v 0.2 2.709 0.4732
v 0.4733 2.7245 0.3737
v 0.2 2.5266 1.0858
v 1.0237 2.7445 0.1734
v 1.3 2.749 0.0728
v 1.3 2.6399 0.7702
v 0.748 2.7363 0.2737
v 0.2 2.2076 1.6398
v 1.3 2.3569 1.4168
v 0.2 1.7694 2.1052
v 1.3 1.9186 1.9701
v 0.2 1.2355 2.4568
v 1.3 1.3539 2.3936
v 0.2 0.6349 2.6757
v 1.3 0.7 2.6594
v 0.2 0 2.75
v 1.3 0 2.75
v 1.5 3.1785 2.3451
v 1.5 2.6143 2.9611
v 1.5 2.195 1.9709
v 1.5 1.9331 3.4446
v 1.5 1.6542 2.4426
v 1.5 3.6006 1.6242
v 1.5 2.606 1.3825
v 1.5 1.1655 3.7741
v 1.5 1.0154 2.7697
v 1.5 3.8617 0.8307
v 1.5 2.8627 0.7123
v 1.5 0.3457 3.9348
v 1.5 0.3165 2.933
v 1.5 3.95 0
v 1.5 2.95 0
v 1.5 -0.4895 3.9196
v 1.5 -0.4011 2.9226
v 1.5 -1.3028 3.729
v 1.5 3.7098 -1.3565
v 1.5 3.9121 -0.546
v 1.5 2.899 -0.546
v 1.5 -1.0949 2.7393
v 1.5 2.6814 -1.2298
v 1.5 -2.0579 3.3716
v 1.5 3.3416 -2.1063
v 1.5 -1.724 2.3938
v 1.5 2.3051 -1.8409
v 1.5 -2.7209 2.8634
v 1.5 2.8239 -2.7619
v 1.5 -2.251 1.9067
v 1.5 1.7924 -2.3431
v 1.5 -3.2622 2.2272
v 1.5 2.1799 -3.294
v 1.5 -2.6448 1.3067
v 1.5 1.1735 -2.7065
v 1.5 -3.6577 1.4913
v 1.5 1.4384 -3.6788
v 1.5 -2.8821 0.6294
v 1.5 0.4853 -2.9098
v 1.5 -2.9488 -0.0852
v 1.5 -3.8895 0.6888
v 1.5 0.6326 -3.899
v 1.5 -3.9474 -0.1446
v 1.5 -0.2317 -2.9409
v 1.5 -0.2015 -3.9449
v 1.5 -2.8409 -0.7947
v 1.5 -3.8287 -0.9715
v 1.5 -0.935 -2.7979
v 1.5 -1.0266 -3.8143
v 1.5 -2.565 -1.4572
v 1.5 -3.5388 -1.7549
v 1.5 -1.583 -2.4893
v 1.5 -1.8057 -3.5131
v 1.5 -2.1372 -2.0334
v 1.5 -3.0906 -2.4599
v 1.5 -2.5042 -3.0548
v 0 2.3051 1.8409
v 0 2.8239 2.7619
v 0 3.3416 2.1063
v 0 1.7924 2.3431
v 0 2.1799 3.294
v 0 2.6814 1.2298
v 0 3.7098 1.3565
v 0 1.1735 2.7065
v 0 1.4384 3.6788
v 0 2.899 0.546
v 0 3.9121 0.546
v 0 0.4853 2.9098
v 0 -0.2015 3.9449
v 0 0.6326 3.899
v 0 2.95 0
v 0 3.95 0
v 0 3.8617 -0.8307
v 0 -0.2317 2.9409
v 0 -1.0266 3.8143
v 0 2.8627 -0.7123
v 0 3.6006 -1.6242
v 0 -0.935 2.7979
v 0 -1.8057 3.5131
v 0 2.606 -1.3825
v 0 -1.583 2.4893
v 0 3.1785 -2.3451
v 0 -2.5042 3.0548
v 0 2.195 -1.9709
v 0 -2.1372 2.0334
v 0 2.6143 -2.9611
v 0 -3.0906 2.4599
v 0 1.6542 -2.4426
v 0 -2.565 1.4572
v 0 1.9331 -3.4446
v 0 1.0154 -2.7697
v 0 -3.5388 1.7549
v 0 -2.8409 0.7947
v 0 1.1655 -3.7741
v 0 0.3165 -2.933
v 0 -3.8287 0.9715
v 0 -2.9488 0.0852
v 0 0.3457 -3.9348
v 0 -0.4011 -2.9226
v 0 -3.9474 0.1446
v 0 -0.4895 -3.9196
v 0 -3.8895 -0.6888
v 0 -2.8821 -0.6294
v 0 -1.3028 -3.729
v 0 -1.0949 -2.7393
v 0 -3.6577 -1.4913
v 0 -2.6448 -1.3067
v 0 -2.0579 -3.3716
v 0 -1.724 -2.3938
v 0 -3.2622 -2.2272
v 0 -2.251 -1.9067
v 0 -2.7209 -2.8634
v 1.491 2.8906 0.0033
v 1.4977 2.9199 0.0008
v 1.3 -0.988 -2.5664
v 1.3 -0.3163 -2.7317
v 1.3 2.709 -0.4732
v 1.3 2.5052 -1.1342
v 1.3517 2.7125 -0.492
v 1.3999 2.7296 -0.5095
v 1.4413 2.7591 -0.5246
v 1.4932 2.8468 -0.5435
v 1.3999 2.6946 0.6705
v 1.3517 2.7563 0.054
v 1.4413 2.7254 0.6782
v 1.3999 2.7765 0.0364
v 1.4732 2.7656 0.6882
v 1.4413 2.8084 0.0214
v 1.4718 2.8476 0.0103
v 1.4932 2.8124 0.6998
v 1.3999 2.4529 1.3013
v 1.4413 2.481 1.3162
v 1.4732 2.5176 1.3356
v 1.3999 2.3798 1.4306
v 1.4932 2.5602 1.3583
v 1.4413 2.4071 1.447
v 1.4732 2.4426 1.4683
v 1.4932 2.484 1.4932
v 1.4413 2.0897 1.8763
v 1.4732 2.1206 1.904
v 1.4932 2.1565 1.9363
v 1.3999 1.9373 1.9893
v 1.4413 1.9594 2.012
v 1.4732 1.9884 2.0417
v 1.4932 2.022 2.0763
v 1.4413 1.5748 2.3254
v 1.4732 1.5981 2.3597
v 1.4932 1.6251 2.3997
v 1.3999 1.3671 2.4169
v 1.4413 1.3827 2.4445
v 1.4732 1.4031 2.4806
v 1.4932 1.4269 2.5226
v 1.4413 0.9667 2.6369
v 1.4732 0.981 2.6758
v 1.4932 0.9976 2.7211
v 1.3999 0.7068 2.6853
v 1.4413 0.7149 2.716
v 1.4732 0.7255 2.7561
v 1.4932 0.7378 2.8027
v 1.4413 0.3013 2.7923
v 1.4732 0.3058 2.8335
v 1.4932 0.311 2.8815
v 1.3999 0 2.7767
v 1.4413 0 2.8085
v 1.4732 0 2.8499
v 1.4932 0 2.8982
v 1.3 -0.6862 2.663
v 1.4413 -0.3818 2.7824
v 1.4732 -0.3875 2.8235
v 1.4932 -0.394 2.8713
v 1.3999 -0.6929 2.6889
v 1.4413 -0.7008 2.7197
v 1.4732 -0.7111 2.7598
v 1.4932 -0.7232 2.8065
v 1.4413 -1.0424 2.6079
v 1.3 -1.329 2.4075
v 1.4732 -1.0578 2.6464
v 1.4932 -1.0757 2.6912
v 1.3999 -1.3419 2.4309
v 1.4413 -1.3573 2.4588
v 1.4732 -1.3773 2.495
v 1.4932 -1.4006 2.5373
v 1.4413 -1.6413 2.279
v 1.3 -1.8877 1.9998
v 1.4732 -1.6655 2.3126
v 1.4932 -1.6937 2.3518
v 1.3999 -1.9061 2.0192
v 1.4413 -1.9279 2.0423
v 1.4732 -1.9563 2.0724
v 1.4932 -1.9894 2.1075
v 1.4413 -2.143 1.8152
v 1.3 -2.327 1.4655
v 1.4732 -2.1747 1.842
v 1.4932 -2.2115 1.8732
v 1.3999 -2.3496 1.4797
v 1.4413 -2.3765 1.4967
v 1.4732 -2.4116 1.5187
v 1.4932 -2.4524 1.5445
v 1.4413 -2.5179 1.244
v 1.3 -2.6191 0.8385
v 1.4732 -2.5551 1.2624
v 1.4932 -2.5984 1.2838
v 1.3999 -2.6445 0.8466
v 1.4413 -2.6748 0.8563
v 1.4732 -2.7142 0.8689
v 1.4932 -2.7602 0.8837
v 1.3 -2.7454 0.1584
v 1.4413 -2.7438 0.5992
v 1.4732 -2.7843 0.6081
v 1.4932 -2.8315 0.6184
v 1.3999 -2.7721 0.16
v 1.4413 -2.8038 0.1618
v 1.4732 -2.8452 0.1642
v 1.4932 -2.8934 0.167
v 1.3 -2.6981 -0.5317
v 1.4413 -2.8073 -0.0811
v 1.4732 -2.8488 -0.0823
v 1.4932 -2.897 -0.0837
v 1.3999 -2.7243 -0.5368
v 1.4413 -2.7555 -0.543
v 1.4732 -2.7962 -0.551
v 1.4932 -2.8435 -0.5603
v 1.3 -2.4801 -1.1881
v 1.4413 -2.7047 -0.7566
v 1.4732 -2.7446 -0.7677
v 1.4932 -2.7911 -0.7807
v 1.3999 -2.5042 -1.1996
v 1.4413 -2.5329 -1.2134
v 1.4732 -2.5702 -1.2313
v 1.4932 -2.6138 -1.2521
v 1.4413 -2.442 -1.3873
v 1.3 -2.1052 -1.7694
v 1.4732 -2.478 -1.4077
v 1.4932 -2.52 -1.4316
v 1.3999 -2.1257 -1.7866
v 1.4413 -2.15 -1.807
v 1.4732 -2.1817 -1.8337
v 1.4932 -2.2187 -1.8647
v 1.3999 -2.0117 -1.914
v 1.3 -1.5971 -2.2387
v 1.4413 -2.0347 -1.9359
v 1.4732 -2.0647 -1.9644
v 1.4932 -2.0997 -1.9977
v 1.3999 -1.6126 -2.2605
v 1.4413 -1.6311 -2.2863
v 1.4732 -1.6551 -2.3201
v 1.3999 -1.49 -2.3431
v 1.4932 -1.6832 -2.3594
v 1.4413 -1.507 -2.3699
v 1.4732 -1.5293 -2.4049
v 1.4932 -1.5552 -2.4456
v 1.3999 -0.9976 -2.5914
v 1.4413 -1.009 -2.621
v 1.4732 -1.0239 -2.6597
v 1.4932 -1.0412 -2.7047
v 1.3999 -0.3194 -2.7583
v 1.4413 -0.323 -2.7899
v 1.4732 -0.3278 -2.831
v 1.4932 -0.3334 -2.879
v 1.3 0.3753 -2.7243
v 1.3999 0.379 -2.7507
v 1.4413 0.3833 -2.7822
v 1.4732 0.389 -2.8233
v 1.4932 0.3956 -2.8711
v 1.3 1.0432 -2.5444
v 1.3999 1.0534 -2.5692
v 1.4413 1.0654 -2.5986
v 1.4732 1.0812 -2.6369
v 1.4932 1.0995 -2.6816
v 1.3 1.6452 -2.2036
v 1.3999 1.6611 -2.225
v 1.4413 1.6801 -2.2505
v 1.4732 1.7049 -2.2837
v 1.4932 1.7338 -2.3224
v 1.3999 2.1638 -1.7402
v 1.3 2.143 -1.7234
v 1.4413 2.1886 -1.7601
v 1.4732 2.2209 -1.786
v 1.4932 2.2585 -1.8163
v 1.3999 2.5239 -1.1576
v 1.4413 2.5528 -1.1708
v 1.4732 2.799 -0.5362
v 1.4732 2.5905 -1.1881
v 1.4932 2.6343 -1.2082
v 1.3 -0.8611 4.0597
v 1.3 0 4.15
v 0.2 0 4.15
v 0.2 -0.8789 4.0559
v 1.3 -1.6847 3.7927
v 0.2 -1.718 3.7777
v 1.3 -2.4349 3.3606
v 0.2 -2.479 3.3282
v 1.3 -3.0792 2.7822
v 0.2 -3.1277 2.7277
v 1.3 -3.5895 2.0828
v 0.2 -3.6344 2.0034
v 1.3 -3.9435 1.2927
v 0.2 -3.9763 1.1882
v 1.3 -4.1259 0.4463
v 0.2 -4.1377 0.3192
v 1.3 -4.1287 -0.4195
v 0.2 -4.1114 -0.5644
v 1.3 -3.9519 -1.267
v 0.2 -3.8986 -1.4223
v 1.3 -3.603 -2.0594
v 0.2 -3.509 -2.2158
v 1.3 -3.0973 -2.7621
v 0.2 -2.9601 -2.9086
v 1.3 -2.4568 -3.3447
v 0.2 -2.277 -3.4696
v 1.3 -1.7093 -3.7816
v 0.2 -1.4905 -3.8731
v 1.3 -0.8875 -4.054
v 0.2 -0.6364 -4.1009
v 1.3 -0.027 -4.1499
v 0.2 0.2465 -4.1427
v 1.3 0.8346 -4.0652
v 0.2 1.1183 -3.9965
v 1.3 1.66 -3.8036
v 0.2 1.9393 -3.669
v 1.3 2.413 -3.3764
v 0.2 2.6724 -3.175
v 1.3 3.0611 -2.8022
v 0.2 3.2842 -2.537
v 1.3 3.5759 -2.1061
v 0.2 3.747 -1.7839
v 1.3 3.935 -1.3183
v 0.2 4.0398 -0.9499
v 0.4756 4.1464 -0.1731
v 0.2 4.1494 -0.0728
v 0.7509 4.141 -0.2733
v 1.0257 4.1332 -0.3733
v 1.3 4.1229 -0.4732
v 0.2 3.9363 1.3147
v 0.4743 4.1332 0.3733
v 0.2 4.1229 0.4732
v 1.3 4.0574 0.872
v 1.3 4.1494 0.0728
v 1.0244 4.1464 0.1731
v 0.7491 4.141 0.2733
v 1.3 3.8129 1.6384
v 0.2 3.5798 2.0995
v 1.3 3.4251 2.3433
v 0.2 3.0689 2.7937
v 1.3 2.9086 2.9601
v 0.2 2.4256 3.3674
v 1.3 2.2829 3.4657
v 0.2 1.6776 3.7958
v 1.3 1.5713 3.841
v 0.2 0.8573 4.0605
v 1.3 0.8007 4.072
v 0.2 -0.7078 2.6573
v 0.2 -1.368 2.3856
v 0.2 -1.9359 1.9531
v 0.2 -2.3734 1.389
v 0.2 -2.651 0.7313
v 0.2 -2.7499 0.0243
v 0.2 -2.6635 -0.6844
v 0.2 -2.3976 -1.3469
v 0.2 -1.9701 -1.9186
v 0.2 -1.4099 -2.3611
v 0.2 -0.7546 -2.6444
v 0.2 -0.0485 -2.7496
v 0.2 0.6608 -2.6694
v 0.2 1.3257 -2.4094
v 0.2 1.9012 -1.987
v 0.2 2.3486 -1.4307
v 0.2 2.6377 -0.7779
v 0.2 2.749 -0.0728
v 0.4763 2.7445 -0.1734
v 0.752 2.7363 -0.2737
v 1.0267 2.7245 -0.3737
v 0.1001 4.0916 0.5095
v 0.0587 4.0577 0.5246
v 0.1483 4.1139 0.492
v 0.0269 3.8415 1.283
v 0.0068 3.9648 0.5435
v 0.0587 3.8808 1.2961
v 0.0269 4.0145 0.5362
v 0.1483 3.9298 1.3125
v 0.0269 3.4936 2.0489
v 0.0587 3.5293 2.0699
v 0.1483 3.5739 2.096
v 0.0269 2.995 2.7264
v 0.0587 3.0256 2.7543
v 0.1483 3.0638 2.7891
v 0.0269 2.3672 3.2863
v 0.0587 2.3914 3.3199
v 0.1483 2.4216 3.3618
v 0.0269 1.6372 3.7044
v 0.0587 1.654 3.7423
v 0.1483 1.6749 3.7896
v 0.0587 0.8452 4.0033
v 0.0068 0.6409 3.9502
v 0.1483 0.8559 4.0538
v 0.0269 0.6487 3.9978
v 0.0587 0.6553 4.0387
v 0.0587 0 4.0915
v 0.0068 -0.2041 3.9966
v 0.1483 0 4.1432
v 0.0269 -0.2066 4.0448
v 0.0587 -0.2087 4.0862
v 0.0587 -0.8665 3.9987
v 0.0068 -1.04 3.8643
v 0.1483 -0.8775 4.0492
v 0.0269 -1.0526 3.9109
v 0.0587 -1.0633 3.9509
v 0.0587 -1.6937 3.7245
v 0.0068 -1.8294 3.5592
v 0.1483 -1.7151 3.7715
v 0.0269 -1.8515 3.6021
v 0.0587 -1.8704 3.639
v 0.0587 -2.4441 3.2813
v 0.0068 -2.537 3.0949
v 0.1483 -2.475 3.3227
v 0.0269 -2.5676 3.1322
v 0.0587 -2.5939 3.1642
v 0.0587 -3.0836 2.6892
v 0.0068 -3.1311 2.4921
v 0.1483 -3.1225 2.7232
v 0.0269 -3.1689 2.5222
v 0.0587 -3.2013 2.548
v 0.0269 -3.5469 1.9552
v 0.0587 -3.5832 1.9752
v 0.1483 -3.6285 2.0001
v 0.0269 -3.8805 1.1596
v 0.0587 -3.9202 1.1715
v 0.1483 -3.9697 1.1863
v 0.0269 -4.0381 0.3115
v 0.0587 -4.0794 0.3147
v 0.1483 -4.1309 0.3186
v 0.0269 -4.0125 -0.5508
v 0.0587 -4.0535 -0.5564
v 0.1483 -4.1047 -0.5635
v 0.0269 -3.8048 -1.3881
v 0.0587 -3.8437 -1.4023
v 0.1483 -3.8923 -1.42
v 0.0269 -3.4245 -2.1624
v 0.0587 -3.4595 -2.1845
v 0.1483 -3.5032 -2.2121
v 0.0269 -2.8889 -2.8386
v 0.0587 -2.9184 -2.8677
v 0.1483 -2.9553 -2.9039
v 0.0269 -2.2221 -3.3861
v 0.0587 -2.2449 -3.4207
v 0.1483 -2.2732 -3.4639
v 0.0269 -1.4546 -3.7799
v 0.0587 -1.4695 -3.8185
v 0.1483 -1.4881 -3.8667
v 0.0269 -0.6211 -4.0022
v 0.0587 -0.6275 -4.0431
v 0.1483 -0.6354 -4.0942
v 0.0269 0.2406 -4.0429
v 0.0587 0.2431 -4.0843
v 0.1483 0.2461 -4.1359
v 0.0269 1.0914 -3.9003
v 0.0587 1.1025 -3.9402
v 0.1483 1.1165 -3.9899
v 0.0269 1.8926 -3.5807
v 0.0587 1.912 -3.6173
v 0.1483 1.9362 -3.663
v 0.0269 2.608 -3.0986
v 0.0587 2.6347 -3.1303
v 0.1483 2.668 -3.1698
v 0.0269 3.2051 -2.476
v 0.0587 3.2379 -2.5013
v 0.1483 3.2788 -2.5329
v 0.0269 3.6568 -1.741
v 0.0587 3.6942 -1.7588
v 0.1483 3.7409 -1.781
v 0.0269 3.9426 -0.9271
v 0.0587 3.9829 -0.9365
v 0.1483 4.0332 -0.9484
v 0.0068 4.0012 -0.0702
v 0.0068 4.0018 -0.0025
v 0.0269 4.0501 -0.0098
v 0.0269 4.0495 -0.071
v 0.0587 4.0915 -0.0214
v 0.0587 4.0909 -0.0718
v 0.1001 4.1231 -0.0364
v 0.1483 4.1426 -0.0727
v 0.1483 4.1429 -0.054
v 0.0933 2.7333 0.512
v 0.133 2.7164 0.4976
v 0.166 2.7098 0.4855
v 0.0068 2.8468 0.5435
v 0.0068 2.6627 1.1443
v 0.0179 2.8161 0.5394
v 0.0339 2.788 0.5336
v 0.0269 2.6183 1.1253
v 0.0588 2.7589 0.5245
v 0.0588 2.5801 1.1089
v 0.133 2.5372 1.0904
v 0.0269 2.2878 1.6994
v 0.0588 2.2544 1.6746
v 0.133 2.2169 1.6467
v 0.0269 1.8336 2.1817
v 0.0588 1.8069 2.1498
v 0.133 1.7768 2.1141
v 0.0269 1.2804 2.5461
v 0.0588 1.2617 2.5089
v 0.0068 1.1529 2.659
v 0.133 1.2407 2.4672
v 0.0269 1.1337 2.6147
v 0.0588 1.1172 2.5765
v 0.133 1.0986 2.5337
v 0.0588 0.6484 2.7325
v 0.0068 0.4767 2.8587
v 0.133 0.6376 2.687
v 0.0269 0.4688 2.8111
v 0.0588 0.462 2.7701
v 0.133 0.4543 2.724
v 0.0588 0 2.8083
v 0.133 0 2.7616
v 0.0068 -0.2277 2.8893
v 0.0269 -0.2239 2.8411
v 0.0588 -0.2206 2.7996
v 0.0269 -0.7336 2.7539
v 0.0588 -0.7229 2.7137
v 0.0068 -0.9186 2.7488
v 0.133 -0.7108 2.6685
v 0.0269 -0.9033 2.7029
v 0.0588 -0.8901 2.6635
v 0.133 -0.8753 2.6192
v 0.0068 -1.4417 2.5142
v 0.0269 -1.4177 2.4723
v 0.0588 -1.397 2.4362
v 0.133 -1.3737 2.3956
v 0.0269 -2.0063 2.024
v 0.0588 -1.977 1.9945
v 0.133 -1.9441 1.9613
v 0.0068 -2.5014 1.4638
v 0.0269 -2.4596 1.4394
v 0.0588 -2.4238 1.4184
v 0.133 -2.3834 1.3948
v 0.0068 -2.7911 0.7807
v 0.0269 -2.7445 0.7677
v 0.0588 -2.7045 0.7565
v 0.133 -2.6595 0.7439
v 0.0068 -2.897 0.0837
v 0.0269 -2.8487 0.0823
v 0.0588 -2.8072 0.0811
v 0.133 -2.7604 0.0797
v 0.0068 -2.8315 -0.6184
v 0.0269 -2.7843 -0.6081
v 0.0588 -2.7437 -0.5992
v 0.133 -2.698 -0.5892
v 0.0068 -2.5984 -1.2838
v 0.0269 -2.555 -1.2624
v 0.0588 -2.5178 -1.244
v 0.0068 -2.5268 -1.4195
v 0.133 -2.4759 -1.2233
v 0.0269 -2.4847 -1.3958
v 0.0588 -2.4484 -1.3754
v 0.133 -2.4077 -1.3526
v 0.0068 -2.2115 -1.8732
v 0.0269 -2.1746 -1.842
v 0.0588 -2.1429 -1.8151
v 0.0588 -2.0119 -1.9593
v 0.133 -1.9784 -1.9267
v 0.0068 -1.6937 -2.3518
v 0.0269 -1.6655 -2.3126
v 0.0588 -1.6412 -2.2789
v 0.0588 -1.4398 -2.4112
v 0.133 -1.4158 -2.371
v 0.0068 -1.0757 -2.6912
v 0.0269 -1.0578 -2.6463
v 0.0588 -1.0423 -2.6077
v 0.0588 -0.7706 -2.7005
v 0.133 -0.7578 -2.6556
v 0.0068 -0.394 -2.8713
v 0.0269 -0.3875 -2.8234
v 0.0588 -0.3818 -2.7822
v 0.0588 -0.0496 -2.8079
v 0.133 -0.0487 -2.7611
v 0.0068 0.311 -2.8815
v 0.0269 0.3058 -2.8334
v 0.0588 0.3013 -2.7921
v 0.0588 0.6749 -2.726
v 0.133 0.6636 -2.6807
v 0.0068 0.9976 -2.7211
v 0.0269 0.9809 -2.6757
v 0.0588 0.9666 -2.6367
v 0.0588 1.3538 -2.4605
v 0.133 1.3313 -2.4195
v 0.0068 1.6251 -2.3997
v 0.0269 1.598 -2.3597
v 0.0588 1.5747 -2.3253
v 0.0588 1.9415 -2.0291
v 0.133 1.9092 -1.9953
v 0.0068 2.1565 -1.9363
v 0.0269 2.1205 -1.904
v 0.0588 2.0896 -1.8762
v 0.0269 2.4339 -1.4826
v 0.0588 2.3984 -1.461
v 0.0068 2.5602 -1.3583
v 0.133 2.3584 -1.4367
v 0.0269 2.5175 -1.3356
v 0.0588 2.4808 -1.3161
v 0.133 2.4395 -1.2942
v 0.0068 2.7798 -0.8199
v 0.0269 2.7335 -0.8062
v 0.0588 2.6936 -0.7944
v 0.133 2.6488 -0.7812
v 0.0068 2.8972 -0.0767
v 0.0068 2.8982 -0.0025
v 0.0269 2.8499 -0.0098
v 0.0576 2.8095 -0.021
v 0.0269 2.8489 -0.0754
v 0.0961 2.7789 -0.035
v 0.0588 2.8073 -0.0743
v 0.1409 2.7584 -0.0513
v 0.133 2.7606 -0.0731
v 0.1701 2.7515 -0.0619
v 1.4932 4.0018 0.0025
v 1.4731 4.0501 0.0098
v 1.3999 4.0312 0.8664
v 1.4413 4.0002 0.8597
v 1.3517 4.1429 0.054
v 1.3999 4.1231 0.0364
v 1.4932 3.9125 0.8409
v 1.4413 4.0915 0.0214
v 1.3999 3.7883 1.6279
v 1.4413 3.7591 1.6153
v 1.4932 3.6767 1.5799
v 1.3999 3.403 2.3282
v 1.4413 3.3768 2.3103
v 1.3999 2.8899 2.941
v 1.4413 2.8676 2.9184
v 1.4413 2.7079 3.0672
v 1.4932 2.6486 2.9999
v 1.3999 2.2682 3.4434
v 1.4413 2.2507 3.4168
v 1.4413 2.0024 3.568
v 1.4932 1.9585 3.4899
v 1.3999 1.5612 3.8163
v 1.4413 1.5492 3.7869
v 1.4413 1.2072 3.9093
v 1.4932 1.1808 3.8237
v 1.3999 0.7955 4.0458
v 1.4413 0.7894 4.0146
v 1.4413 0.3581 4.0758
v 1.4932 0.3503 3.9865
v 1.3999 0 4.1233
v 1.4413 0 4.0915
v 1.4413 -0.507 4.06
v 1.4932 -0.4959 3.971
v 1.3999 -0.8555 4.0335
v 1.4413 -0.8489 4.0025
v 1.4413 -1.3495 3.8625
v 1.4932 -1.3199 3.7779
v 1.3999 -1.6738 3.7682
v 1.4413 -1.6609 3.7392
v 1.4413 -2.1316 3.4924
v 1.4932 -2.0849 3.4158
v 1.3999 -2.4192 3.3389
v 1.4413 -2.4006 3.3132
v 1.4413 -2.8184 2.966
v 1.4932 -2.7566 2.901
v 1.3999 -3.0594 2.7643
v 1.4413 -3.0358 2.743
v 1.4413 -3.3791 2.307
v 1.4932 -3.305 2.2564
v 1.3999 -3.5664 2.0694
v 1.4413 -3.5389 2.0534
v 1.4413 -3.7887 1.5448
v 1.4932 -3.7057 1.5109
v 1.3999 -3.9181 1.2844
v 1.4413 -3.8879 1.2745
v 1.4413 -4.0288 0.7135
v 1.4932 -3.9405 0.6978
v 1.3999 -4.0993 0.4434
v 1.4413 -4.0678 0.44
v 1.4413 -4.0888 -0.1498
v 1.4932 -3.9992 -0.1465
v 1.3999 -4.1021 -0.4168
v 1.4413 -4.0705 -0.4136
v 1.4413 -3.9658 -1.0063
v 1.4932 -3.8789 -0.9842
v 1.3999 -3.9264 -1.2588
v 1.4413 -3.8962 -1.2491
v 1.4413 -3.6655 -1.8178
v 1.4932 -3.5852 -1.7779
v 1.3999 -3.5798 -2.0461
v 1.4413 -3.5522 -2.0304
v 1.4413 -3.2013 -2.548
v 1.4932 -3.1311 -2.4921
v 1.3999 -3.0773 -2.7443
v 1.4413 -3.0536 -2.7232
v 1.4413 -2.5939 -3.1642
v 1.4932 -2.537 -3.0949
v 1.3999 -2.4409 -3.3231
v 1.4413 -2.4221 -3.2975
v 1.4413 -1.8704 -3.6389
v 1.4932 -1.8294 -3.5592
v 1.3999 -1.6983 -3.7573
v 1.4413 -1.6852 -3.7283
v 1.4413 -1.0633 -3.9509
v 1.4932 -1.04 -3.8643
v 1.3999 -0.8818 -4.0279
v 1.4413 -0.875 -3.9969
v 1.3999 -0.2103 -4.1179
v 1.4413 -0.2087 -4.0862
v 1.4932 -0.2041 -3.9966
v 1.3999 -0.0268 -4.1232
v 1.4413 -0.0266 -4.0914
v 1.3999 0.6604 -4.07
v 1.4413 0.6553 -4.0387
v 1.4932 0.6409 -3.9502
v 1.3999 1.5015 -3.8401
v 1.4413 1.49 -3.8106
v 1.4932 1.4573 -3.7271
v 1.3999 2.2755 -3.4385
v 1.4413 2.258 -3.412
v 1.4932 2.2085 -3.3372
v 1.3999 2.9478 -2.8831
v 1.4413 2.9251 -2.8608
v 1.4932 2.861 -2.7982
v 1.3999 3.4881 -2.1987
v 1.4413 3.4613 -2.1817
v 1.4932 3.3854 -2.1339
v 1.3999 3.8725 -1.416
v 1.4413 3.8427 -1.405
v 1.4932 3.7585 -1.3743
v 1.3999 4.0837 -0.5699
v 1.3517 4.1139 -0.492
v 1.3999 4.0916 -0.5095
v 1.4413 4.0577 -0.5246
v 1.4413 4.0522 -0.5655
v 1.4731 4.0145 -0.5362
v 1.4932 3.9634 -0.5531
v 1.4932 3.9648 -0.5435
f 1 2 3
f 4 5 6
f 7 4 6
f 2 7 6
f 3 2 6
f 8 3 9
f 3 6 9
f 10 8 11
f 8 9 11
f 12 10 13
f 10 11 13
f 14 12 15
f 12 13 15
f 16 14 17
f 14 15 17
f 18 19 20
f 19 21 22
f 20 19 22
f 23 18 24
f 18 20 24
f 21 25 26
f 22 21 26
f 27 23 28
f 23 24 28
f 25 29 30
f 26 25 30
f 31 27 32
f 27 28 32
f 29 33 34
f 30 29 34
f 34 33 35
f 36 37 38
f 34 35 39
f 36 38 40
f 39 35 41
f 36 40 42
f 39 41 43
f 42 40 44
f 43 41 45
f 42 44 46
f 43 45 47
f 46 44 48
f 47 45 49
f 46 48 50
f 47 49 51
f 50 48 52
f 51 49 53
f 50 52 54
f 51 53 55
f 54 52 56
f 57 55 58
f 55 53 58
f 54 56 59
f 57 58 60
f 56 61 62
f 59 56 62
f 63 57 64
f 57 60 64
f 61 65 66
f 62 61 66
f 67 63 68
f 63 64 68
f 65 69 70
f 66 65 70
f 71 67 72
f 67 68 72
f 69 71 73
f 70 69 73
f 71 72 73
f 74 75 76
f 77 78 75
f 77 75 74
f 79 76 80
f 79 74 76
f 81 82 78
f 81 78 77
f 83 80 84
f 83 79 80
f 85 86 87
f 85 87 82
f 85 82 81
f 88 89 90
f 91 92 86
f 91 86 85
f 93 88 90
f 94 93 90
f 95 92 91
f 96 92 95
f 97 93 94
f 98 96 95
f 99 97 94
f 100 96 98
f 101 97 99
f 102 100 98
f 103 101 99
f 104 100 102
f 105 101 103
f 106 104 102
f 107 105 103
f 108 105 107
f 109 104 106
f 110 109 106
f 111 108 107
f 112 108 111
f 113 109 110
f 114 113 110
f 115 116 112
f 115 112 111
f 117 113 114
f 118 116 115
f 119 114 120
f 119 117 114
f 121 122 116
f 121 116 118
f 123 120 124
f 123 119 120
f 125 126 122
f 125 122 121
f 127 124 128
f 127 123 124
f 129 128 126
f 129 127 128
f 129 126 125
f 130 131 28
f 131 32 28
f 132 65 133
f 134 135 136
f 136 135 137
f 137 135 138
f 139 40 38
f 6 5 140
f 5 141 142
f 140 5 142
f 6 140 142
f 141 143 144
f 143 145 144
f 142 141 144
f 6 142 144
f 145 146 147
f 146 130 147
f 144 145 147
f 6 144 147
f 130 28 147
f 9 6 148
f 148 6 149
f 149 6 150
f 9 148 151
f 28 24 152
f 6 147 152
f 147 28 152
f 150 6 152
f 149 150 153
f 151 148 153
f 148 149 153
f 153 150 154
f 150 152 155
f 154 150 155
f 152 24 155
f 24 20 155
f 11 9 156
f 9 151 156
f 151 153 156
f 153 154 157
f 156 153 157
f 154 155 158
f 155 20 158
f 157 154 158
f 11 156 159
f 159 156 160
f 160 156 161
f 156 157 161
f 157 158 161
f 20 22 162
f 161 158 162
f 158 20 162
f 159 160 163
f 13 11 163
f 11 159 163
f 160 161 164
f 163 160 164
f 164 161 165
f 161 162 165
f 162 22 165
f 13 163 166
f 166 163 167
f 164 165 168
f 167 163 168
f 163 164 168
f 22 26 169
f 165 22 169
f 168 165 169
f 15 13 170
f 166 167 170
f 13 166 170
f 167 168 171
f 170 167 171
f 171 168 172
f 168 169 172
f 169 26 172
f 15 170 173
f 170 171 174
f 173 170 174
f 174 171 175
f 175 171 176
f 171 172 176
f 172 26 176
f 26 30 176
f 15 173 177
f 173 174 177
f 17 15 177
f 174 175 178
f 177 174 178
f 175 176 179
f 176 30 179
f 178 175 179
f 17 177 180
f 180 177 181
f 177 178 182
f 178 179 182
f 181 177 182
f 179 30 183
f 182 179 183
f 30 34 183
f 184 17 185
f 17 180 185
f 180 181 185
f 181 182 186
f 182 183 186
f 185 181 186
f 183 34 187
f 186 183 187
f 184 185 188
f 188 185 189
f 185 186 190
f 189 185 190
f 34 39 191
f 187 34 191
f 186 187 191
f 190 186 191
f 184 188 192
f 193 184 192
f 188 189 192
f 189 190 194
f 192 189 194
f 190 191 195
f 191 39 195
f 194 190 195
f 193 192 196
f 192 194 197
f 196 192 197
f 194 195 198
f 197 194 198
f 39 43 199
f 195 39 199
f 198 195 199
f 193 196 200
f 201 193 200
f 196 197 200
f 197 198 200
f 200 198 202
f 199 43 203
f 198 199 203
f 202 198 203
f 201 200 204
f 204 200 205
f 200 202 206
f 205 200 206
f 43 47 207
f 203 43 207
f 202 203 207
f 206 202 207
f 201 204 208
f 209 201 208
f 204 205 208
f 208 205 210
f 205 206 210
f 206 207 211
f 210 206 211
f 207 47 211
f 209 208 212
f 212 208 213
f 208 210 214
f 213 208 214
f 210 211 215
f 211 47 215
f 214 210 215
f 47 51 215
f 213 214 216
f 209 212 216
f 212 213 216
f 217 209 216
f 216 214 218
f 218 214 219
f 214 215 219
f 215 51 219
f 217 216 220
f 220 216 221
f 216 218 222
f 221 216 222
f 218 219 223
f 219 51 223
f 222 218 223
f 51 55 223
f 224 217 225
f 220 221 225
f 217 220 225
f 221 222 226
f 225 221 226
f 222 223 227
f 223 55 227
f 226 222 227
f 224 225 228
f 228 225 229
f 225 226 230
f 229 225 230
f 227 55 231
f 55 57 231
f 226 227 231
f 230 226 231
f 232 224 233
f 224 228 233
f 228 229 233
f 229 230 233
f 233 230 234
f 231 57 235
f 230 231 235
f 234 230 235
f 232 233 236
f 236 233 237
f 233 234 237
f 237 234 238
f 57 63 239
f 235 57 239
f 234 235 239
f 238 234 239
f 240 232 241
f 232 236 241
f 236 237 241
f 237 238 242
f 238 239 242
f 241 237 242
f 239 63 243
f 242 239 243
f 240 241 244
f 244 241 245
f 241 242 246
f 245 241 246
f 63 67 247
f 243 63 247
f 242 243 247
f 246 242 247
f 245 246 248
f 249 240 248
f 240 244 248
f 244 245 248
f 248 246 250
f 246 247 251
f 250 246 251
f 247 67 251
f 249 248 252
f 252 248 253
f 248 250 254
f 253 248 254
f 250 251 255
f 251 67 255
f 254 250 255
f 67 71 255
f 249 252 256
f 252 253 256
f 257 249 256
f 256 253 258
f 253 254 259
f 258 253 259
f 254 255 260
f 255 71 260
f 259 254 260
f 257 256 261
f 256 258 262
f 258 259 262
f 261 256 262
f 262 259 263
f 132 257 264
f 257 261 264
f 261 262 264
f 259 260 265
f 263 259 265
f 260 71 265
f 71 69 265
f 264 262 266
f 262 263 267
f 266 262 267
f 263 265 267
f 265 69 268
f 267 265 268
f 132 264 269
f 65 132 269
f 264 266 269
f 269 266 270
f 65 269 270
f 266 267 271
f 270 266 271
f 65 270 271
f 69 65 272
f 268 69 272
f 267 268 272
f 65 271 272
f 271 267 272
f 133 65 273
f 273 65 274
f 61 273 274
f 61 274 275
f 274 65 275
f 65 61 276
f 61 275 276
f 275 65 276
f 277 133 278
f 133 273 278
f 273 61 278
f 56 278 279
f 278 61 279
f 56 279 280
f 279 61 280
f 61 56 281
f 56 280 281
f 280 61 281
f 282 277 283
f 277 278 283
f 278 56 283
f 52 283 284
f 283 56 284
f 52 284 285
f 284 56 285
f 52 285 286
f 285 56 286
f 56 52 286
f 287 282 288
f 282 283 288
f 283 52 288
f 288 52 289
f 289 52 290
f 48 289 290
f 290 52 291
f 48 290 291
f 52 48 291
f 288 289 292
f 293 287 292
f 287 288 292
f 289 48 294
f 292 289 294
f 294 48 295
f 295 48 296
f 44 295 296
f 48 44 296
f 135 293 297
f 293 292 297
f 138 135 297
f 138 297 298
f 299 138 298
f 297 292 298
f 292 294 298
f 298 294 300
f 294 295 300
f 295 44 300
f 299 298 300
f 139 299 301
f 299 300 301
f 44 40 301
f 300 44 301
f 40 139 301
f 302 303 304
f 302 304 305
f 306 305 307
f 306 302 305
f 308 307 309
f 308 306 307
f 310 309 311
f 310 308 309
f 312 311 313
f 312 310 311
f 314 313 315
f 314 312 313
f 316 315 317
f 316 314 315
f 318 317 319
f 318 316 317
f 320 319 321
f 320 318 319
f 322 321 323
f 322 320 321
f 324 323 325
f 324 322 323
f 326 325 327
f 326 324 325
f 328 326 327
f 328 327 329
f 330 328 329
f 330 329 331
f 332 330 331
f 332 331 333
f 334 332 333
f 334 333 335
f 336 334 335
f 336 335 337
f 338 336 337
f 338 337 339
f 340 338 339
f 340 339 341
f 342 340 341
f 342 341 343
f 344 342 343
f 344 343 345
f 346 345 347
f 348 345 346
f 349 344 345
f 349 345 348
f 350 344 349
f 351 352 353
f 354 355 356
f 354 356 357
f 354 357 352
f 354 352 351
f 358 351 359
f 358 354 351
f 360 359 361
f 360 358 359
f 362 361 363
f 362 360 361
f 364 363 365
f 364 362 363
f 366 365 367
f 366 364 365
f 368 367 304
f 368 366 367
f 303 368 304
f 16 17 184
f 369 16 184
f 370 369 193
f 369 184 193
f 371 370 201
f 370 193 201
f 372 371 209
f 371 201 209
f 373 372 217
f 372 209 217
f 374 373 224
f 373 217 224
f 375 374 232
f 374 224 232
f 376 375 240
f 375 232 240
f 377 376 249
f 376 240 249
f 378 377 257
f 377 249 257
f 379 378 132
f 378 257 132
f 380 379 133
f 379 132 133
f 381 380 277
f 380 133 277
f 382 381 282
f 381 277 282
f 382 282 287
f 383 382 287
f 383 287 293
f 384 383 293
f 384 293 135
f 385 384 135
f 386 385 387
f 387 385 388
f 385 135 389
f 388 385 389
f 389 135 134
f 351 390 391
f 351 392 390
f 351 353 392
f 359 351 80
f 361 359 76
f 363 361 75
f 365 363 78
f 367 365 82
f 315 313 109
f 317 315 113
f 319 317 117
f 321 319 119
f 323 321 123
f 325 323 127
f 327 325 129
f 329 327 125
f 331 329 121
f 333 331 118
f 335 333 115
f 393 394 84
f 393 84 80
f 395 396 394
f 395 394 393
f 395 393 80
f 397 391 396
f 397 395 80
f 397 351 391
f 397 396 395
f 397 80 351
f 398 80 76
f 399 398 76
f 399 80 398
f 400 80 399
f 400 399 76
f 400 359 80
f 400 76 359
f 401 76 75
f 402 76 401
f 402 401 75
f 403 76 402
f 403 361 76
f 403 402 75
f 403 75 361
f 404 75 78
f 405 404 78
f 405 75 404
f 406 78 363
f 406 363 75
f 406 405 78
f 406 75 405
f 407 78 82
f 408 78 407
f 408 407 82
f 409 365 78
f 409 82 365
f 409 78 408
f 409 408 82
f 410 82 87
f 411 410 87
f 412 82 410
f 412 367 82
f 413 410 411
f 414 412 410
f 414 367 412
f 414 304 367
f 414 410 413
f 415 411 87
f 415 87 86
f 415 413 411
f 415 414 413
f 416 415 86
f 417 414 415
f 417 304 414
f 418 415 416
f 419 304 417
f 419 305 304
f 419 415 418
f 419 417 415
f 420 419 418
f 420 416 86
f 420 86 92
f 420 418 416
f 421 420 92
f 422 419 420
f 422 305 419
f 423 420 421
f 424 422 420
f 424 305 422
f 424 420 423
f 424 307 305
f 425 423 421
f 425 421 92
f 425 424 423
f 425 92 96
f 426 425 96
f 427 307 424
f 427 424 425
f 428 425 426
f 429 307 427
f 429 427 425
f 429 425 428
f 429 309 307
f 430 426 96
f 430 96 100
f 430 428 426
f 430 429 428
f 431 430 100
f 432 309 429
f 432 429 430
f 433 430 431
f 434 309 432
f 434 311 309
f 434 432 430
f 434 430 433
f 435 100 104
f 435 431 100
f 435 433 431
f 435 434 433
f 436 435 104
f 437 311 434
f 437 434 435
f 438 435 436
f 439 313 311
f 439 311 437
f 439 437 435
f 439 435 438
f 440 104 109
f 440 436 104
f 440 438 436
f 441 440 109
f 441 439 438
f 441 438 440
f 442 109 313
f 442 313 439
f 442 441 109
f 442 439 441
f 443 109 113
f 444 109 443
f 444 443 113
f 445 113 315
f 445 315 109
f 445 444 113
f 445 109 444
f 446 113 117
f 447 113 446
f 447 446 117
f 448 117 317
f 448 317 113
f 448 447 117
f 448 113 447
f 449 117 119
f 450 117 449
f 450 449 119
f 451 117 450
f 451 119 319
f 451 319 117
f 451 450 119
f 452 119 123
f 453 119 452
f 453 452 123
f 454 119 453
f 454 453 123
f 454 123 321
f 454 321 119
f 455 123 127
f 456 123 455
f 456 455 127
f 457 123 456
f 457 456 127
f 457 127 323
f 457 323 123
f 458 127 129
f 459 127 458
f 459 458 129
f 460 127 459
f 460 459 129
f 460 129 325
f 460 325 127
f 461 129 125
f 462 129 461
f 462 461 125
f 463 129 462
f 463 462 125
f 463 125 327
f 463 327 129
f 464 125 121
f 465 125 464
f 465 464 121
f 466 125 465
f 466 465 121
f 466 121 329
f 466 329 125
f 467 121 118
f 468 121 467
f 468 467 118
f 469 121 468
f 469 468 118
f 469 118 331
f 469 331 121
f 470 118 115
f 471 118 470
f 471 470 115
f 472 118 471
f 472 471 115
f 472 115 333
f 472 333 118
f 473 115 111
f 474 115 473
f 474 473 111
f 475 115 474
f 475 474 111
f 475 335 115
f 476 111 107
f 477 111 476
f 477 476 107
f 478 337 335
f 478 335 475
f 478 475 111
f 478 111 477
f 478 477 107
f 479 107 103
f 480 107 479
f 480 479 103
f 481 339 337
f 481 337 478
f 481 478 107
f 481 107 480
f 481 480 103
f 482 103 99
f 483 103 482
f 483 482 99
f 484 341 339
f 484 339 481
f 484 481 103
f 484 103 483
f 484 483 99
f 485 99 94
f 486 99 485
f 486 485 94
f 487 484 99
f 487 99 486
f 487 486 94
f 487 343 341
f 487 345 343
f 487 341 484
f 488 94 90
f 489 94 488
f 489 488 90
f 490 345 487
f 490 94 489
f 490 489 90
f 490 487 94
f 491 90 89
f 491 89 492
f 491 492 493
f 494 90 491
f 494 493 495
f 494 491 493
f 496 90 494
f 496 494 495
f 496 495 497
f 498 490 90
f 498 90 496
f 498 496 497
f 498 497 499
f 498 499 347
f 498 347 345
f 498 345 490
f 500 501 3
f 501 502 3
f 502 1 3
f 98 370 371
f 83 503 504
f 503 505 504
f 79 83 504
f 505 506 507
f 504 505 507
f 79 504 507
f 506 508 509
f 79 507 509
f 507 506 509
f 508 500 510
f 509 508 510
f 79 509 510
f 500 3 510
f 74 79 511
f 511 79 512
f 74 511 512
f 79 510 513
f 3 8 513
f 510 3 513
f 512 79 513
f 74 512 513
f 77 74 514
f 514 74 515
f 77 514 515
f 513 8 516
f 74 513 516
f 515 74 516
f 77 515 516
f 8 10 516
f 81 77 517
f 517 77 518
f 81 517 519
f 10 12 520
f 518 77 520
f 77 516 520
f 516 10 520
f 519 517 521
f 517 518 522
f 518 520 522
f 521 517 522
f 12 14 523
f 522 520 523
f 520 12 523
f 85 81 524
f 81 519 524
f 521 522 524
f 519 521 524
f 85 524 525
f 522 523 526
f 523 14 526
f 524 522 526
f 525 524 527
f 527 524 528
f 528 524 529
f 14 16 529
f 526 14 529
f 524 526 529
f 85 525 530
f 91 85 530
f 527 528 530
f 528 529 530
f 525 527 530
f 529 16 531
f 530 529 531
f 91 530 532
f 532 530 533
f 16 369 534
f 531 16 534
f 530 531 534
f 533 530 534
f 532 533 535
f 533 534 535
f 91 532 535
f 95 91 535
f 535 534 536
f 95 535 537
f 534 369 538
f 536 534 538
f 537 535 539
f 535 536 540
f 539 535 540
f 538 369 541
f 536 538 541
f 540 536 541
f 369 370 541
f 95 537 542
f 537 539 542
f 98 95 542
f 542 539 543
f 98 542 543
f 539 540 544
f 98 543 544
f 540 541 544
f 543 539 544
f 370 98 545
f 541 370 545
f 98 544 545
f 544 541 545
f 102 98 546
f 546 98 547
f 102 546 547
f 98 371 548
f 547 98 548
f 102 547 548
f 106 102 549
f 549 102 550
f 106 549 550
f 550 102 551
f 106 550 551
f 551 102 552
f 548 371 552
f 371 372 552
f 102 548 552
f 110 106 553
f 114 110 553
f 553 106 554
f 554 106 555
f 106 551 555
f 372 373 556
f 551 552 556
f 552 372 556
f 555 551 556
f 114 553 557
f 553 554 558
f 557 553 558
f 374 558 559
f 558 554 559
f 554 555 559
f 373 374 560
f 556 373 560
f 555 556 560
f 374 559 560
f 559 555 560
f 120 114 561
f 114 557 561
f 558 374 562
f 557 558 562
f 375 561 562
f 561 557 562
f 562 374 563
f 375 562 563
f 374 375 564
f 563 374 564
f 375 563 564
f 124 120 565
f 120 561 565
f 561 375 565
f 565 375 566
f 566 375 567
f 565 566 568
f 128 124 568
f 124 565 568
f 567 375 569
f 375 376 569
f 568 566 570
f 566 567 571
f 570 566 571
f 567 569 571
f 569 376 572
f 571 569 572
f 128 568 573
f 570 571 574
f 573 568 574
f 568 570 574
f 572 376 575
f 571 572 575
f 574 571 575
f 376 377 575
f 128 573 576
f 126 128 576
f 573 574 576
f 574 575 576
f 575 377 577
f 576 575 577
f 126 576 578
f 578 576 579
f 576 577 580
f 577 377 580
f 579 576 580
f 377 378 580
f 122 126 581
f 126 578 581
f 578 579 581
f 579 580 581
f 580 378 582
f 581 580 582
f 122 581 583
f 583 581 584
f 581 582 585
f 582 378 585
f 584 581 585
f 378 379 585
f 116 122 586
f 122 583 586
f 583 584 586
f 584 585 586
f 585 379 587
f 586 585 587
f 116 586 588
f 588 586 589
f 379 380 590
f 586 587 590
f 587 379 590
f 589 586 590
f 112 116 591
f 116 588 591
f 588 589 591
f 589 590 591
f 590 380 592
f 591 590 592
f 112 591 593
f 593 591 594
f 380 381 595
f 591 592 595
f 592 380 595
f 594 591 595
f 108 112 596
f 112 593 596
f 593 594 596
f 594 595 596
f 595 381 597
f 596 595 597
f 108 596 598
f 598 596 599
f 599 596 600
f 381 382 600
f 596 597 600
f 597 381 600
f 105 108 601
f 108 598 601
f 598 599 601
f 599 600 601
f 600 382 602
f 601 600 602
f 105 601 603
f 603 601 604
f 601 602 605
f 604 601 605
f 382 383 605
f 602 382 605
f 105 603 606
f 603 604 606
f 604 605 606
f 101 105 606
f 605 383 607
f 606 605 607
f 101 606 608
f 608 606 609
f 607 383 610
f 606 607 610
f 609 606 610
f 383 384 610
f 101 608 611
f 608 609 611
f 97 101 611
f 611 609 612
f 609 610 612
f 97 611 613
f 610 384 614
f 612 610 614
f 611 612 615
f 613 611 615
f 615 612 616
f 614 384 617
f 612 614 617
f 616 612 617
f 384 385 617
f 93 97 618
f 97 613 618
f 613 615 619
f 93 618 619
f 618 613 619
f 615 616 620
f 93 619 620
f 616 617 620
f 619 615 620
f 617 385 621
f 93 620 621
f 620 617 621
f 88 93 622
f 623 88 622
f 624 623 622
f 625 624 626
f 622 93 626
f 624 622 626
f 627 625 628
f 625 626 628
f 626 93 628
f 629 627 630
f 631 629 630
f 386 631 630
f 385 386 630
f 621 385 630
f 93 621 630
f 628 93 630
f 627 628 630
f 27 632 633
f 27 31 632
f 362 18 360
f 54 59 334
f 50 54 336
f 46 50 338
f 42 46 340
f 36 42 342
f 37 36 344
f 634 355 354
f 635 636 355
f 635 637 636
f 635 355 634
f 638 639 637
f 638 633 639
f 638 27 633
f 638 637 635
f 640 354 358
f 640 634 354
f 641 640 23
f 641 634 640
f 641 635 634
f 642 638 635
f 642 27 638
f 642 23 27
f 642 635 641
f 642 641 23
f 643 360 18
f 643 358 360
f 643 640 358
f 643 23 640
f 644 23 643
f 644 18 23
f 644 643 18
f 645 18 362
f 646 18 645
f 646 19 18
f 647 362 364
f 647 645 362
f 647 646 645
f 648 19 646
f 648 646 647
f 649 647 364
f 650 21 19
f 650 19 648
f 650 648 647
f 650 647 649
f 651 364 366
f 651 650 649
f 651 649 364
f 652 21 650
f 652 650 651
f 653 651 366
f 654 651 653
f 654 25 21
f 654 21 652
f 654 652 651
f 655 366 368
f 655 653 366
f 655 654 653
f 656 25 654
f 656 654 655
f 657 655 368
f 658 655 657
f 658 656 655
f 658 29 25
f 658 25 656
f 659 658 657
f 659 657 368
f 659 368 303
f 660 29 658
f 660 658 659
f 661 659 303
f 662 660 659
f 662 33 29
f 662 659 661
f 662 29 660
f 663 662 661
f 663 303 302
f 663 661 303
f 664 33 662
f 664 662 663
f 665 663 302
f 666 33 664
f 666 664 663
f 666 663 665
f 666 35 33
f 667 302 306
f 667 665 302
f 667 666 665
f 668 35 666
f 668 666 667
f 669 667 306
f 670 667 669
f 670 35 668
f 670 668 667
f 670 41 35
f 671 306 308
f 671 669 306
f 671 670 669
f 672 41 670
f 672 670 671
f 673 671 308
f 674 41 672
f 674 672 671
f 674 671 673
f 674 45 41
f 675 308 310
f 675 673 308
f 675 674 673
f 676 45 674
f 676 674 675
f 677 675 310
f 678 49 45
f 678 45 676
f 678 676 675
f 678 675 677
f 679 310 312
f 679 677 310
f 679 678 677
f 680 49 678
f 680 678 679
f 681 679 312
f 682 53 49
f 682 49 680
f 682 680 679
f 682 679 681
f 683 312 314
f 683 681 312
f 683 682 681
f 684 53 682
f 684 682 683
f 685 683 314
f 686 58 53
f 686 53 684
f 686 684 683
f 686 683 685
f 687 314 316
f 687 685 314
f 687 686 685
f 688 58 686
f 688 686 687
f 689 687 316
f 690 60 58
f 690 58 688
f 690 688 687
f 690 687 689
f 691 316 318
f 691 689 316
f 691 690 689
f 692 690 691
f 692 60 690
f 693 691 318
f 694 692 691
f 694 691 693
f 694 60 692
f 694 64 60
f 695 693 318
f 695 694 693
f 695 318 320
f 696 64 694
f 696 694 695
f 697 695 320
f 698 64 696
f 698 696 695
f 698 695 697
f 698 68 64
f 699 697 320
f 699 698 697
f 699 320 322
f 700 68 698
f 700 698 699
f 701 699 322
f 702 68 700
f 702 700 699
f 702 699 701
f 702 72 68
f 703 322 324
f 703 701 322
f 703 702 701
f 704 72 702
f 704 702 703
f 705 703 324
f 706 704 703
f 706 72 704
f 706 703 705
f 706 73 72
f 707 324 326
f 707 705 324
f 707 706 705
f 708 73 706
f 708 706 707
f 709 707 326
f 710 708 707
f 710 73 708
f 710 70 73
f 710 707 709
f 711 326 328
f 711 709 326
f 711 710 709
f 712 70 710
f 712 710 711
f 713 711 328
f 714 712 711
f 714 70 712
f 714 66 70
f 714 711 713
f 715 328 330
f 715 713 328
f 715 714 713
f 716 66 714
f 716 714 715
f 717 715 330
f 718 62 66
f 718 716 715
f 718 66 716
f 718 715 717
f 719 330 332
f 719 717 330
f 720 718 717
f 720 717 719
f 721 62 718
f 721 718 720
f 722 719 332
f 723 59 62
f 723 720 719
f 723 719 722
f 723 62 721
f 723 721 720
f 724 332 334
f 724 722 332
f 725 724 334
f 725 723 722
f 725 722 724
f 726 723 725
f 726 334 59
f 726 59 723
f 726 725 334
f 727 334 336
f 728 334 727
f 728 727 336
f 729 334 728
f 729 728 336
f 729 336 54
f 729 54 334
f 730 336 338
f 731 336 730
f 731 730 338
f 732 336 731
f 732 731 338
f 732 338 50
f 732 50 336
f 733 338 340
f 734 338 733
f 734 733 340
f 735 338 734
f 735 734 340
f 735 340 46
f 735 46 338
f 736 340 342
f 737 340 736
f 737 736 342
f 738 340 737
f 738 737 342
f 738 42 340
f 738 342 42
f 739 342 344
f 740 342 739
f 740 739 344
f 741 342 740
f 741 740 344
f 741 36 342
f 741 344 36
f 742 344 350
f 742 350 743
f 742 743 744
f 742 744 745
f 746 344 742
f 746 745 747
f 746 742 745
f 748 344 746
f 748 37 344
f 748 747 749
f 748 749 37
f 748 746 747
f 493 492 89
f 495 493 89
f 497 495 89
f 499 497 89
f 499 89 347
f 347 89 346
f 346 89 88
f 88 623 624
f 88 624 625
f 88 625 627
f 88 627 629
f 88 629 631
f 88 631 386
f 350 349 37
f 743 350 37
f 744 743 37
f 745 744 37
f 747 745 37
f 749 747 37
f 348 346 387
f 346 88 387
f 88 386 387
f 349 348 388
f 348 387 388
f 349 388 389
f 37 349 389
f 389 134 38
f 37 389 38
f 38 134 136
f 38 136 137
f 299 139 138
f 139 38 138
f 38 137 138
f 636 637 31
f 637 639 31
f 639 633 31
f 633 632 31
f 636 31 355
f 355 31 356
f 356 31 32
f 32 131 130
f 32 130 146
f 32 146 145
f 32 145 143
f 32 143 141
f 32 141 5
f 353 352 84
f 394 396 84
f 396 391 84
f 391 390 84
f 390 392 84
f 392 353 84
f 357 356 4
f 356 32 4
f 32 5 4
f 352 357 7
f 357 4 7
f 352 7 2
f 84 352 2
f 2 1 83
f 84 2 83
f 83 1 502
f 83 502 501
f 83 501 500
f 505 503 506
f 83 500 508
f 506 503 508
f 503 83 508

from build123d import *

# Parameters (mm, degrees)
ESQUISSE1_W             = 1.5
ESQUISSE1_H             = 1.4
ENL_V_MAT_EXTRU_1_DEPTH = 7.057639804
CONG_1_R                = 0.2


with BuildPart() as part:
    # Esquisse1 → Base-Révolution (revolve)
    with BuildSketch(Plane(origin=(0, 0, 0), x_dir=(1, 0, 0), z_dir=(0, 1, 0))):
        with Locations((0.75, 3.45)):
            Rectangle(ESQUISSE1_W, ESQUISSE1_H)
    revolve(axis=Axis((0, 0, 0), (1, 0, 0)))

    # Esquisse2 → Enlèv. mat.-Extru.1 (cut, through all)
    with BuildSketch(Plane(origin=(0, 0, 0), x_dir=(1, 0, 0), z_dir=(0, 1, 0))):
        Polygon((0, 0), (1.5, 0.545955351), (1.5, 0), (0, -0.545955351), align=None)
    extrude(amount=ENL_V_MAT_EXTRU_1_DEPTH, mode=Mode.SUBTRACT)

    # Congé1
    cong_1_edges = [part.edges().sort_by_distance(p)[0] for p in [
        (1.5, -2.934493142, 2.934493142),
        (0, -3.121555278, 2.734664997),
        (1.5, -1.944543648, 1.944543648),
        (0, -2.128835035, 1.740850767),
    ]]
    fillet(cong_1_edges, radius=CONG_1_R)


solid = part.part
